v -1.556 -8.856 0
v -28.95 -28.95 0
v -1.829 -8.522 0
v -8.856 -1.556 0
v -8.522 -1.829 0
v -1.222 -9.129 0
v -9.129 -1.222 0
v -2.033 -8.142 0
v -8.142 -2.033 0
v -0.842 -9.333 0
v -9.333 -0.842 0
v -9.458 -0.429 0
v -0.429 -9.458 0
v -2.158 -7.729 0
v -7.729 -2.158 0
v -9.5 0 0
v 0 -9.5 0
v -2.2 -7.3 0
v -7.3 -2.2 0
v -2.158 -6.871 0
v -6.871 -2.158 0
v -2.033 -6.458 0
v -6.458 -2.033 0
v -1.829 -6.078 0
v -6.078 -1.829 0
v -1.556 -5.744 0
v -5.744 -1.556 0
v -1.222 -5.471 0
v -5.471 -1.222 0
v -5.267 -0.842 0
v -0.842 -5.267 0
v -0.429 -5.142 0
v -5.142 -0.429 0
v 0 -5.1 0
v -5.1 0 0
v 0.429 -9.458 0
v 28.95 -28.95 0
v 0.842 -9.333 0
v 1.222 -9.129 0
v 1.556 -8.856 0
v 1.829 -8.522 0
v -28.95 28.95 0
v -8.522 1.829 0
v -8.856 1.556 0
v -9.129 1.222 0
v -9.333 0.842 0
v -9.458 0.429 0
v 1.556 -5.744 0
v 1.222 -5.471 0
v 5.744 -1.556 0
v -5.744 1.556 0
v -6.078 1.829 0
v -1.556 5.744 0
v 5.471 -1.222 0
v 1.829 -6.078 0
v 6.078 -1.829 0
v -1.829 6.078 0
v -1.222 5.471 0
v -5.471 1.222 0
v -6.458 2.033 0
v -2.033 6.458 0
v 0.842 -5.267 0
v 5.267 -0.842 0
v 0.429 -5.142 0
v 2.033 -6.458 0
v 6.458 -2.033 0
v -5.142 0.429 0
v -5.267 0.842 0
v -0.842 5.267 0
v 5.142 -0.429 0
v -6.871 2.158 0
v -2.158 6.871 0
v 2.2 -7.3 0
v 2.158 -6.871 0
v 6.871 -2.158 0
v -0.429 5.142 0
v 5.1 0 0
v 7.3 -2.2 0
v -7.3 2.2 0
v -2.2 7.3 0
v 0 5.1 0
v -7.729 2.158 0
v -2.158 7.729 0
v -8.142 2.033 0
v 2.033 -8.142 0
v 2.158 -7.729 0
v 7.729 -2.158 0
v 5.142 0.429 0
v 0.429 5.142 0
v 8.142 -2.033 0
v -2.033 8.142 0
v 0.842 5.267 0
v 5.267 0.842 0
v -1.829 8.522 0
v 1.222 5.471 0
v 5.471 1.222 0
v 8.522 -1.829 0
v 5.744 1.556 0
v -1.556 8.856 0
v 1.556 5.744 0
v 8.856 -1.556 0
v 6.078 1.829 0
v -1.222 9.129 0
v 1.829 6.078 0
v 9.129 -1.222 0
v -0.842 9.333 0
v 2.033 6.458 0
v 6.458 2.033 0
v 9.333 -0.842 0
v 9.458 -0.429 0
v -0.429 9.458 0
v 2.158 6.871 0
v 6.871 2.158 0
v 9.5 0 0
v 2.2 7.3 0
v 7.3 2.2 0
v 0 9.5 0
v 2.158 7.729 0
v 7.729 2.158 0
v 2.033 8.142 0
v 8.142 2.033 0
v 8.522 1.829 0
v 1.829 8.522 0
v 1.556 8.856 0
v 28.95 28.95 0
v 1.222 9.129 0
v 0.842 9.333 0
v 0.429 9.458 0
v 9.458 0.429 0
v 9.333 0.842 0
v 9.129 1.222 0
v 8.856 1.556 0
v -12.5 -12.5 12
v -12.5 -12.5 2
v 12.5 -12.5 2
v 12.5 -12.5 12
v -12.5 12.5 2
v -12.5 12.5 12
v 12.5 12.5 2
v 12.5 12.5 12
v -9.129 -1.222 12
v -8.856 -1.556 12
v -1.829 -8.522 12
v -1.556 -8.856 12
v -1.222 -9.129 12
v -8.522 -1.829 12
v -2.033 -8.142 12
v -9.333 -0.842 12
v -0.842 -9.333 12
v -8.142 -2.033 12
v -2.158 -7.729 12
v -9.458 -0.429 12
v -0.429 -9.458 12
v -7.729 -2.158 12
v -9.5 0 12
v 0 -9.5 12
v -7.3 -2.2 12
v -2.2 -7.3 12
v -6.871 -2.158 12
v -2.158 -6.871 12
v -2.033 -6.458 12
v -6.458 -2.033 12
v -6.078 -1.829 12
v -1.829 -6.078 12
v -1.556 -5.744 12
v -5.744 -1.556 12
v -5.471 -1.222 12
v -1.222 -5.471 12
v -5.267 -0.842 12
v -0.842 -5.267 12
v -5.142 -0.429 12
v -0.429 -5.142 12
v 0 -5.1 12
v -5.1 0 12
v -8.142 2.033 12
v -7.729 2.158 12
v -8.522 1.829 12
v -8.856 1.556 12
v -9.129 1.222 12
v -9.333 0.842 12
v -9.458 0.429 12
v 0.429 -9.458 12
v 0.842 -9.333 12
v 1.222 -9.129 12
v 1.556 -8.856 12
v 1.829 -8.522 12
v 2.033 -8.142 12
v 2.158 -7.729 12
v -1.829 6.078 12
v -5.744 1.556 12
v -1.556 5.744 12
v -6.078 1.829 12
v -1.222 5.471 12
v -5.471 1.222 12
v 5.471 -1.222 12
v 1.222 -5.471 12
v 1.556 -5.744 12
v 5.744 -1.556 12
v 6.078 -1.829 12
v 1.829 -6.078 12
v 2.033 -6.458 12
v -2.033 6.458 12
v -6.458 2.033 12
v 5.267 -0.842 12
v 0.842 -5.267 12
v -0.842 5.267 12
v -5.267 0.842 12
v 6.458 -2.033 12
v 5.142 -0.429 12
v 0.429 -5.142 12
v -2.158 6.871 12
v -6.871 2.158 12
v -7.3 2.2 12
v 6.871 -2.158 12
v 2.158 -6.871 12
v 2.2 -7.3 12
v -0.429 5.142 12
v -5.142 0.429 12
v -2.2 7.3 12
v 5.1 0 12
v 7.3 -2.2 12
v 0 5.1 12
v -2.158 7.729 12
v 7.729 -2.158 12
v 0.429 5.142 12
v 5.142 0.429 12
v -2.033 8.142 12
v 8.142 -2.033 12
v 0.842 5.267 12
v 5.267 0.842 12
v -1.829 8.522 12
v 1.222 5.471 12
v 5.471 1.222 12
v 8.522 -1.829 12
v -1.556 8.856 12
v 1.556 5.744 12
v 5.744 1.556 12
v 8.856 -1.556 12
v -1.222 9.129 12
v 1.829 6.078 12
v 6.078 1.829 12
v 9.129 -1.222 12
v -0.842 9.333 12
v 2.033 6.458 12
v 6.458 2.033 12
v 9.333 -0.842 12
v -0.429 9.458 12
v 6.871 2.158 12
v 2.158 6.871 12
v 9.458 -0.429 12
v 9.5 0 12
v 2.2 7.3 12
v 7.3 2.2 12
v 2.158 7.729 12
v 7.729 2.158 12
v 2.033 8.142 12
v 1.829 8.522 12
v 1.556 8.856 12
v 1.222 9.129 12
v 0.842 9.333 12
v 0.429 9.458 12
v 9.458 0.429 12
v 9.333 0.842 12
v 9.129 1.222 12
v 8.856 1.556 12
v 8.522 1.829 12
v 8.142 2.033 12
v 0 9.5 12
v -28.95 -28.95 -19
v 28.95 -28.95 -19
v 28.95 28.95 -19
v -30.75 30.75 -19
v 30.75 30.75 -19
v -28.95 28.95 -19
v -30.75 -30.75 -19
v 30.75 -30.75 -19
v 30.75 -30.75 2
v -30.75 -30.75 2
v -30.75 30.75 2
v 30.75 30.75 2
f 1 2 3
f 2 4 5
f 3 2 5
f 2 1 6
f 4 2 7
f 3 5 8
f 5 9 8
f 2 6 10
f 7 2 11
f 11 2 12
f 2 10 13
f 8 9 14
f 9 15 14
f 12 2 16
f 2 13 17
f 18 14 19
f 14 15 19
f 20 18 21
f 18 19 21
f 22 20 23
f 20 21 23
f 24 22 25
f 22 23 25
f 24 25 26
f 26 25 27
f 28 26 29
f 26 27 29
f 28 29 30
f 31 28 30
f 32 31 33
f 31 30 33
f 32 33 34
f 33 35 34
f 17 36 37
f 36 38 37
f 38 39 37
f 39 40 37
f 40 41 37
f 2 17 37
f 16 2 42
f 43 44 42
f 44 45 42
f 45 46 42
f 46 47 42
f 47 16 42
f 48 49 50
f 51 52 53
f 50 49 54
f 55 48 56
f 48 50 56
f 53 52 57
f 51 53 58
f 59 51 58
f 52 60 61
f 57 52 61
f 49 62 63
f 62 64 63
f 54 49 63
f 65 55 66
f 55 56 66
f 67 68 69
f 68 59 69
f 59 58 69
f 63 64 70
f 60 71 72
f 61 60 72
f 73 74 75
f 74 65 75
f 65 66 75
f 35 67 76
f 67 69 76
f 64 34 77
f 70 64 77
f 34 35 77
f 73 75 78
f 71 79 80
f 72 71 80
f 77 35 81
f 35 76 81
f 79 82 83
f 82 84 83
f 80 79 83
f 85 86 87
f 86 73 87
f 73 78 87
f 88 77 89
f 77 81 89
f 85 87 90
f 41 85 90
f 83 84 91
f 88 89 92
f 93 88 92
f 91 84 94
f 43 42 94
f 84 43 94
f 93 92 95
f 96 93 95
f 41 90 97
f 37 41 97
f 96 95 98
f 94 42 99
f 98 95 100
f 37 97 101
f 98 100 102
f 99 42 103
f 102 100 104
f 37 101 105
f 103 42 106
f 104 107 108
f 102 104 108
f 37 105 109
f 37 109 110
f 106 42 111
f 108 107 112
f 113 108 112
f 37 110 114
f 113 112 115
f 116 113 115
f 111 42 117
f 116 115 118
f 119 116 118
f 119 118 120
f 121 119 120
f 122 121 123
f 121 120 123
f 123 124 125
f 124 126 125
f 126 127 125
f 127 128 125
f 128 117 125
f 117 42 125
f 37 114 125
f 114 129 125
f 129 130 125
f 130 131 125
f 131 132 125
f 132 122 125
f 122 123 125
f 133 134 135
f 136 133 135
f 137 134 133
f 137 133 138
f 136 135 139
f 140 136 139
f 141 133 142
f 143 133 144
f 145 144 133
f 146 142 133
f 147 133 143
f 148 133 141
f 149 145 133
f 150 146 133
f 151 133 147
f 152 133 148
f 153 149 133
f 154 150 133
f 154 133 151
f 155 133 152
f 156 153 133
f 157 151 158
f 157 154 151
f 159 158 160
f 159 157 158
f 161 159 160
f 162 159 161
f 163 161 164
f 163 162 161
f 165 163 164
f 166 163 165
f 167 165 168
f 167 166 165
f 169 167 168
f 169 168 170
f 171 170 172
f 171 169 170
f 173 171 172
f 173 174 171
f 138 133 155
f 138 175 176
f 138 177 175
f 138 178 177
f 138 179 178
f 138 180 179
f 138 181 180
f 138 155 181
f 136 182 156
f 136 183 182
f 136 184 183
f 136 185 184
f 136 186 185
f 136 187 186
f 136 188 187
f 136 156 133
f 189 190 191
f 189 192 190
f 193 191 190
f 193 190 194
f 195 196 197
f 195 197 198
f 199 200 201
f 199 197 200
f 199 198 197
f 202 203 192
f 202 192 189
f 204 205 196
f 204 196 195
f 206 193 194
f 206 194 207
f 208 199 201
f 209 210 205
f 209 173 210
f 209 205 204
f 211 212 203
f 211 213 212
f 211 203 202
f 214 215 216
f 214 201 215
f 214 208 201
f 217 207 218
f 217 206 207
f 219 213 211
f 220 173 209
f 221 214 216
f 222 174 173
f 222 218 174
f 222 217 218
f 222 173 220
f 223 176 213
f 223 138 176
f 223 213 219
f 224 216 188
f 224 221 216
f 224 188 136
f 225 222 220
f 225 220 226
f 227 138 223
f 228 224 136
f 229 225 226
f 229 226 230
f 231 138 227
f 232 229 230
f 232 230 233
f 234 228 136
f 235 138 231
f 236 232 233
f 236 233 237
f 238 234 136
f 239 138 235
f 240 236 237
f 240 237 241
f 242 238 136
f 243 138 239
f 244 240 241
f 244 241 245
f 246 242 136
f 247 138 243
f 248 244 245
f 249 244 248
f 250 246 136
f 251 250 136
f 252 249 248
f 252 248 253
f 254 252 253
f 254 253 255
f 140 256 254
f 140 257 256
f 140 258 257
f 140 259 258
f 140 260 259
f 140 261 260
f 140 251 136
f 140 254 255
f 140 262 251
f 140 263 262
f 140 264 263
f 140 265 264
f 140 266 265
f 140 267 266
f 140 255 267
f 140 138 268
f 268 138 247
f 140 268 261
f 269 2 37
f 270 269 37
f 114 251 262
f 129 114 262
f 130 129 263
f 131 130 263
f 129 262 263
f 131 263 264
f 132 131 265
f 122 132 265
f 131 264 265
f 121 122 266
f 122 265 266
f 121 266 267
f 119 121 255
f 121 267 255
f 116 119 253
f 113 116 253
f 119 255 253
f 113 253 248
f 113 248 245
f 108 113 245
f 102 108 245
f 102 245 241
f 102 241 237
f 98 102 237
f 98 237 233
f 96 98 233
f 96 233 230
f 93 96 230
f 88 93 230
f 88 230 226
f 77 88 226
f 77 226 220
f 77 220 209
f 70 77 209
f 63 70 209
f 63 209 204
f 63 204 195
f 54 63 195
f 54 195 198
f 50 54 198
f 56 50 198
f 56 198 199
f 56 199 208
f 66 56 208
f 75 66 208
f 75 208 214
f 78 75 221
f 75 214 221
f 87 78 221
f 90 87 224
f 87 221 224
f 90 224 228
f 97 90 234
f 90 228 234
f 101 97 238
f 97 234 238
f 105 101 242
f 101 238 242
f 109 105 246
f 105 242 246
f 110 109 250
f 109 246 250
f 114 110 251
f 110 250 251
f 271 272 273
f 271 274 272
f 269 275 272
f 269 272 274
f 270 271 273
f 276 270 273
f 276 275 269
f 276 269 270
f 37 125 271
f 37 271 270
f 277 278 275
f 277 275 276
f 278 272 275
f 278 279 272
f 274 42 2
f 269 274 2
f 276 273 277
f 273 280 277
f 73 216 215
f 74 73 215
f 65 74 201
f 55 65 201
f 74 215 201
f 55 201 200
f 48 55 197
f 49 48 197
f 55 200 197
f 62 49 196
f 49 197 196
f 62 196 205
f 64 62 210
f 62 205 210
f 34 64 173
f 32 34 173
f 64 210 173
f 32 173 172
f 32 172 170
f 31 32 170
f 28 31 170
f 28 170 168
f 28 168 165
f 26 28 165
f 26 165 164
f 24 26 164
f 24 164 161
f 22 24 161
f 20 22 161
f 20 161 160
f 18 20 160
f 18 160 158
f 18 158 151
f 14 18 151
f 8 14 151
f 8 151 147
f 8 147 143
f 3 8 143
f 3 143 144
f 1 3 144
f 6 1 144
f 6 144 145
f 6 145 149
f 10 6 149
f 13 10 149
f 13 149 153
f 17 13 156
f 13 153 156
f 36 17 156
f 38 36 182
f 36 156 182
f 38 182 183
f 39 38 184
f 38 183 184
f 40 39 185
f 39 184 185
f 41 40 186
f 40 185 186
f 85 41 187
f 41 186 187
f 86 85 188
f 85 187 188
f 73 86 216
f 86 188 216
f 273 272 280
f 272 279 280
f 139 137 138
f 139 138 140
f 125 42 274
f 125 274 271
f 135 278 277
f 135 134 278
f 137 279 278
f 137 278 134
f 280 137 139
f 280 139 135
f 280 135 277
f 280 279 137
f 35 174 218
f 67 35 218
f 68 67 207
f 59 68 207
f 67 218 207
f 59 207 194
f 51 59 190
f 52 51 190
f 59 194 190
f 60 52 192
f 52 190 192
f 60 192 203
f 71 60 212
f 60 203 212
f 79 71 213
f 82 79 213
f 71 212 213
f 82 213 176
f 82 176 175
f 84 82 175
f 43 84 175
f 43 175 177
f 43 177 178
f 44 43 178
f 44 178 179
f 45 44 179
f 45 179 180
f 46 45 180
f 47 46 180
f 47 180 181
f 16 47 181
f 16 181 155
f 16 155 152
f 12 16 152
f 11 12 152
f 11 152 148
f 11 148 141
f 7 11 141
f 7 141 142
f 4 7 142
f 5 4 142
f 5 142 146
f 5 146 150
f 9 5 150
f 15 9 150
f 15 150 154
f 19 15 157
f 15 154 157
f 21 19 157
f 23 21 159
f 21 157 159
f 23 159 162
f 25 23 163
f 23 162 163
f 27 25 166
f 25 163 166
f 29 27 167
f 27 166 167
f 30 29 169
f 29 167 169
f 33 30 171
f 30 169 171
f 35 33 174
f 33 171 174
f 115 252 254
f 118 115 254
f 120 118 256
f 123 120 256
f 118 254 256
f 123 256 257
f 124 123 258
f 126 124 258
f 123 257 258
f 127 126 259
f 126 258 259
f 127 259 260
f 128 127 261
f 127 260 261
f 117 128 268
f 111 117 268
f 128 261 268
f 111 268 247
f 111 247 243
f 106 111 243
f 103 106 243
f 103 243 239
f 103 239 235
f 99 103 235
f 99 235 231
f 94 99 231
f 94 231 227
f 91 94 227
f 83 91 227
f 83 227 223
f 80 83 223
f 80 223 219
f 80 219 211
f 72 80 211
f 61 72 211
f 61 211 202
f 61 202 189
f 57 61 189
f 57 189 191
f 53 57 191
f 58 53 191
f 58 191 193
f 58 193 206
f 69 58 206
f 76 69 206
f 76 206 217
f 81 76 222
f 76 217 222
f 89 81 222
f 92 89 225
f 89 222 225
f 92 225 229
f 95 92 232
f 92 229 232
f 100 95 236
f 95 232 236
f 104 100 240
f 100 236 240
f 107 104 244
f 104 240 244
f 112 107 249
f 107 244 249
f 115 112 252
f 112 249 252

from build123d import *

# Parameters (mm, degrees)
SKETCH_W      = 61.5
SKETCH_H      = 61.5
PAD_DEPTH     = 2
SKETCH001_W   = 61.5
SKETCH001_H   = 61.5
SKETCH001_W_2 = 57.9
SKETCH001_H_2 = 57.9
PAD001_DEPTH  = 19
SKETCH002_W   = 25
SKETCH002_H   = 25
PAD002_DEPTH  = 10
SKETCH003_R   = 2.2
POCKET_DEPTH  = 31.001


with BuildPart() as part:
    # Sketch → Pad (new body)
    with BuildSketch(Plane.XY):
        Rectangle(SKETCH_W, SKETCH_H)
    extrude(amount=PAD_DEPTH)

    # Sketch001 → Pad001 (new body)
    with BuildSketch(Plane(origin=(0, 0, 0), x_dir=(1, 0, 0), z_dir=(0, 0, -1))):
        Rectangle(SKETCH001_W, SKETCH001_H)
        Rectangle(SKETCH001_W_2, SKETCH001_H_2, mode=Mode.SUBTRACT)
    extrude(amount=PAD001_DEPTH)

    # Sketch002 → Pad002 (new body)
    with BuildSketch(Plane.XY.offset(2)):
        Rectangle(SKETCH002_W, SKETCH002_H)
    extrude(amount=PAD002_DEPTH)

    # Sketch003 → Pocket (cut, through all)
    with BuildSketch(Plane.XY.offset(12)):
        with Locations((-7.3, 0)):
            Circle(SKETCH003_R)
        with Locations((7.3, 0)):
            Circle(SKETCH003_R)
        with Locations((0, 7.3)):
            Circle(SKETCH003_R)
        with Locations((0, -7.3)):
            Circle(SKETCH003_R)
    extrude(amount=-POCKET_DEPTH, mode=Mode.SUBTRACT)


solid = part.part
